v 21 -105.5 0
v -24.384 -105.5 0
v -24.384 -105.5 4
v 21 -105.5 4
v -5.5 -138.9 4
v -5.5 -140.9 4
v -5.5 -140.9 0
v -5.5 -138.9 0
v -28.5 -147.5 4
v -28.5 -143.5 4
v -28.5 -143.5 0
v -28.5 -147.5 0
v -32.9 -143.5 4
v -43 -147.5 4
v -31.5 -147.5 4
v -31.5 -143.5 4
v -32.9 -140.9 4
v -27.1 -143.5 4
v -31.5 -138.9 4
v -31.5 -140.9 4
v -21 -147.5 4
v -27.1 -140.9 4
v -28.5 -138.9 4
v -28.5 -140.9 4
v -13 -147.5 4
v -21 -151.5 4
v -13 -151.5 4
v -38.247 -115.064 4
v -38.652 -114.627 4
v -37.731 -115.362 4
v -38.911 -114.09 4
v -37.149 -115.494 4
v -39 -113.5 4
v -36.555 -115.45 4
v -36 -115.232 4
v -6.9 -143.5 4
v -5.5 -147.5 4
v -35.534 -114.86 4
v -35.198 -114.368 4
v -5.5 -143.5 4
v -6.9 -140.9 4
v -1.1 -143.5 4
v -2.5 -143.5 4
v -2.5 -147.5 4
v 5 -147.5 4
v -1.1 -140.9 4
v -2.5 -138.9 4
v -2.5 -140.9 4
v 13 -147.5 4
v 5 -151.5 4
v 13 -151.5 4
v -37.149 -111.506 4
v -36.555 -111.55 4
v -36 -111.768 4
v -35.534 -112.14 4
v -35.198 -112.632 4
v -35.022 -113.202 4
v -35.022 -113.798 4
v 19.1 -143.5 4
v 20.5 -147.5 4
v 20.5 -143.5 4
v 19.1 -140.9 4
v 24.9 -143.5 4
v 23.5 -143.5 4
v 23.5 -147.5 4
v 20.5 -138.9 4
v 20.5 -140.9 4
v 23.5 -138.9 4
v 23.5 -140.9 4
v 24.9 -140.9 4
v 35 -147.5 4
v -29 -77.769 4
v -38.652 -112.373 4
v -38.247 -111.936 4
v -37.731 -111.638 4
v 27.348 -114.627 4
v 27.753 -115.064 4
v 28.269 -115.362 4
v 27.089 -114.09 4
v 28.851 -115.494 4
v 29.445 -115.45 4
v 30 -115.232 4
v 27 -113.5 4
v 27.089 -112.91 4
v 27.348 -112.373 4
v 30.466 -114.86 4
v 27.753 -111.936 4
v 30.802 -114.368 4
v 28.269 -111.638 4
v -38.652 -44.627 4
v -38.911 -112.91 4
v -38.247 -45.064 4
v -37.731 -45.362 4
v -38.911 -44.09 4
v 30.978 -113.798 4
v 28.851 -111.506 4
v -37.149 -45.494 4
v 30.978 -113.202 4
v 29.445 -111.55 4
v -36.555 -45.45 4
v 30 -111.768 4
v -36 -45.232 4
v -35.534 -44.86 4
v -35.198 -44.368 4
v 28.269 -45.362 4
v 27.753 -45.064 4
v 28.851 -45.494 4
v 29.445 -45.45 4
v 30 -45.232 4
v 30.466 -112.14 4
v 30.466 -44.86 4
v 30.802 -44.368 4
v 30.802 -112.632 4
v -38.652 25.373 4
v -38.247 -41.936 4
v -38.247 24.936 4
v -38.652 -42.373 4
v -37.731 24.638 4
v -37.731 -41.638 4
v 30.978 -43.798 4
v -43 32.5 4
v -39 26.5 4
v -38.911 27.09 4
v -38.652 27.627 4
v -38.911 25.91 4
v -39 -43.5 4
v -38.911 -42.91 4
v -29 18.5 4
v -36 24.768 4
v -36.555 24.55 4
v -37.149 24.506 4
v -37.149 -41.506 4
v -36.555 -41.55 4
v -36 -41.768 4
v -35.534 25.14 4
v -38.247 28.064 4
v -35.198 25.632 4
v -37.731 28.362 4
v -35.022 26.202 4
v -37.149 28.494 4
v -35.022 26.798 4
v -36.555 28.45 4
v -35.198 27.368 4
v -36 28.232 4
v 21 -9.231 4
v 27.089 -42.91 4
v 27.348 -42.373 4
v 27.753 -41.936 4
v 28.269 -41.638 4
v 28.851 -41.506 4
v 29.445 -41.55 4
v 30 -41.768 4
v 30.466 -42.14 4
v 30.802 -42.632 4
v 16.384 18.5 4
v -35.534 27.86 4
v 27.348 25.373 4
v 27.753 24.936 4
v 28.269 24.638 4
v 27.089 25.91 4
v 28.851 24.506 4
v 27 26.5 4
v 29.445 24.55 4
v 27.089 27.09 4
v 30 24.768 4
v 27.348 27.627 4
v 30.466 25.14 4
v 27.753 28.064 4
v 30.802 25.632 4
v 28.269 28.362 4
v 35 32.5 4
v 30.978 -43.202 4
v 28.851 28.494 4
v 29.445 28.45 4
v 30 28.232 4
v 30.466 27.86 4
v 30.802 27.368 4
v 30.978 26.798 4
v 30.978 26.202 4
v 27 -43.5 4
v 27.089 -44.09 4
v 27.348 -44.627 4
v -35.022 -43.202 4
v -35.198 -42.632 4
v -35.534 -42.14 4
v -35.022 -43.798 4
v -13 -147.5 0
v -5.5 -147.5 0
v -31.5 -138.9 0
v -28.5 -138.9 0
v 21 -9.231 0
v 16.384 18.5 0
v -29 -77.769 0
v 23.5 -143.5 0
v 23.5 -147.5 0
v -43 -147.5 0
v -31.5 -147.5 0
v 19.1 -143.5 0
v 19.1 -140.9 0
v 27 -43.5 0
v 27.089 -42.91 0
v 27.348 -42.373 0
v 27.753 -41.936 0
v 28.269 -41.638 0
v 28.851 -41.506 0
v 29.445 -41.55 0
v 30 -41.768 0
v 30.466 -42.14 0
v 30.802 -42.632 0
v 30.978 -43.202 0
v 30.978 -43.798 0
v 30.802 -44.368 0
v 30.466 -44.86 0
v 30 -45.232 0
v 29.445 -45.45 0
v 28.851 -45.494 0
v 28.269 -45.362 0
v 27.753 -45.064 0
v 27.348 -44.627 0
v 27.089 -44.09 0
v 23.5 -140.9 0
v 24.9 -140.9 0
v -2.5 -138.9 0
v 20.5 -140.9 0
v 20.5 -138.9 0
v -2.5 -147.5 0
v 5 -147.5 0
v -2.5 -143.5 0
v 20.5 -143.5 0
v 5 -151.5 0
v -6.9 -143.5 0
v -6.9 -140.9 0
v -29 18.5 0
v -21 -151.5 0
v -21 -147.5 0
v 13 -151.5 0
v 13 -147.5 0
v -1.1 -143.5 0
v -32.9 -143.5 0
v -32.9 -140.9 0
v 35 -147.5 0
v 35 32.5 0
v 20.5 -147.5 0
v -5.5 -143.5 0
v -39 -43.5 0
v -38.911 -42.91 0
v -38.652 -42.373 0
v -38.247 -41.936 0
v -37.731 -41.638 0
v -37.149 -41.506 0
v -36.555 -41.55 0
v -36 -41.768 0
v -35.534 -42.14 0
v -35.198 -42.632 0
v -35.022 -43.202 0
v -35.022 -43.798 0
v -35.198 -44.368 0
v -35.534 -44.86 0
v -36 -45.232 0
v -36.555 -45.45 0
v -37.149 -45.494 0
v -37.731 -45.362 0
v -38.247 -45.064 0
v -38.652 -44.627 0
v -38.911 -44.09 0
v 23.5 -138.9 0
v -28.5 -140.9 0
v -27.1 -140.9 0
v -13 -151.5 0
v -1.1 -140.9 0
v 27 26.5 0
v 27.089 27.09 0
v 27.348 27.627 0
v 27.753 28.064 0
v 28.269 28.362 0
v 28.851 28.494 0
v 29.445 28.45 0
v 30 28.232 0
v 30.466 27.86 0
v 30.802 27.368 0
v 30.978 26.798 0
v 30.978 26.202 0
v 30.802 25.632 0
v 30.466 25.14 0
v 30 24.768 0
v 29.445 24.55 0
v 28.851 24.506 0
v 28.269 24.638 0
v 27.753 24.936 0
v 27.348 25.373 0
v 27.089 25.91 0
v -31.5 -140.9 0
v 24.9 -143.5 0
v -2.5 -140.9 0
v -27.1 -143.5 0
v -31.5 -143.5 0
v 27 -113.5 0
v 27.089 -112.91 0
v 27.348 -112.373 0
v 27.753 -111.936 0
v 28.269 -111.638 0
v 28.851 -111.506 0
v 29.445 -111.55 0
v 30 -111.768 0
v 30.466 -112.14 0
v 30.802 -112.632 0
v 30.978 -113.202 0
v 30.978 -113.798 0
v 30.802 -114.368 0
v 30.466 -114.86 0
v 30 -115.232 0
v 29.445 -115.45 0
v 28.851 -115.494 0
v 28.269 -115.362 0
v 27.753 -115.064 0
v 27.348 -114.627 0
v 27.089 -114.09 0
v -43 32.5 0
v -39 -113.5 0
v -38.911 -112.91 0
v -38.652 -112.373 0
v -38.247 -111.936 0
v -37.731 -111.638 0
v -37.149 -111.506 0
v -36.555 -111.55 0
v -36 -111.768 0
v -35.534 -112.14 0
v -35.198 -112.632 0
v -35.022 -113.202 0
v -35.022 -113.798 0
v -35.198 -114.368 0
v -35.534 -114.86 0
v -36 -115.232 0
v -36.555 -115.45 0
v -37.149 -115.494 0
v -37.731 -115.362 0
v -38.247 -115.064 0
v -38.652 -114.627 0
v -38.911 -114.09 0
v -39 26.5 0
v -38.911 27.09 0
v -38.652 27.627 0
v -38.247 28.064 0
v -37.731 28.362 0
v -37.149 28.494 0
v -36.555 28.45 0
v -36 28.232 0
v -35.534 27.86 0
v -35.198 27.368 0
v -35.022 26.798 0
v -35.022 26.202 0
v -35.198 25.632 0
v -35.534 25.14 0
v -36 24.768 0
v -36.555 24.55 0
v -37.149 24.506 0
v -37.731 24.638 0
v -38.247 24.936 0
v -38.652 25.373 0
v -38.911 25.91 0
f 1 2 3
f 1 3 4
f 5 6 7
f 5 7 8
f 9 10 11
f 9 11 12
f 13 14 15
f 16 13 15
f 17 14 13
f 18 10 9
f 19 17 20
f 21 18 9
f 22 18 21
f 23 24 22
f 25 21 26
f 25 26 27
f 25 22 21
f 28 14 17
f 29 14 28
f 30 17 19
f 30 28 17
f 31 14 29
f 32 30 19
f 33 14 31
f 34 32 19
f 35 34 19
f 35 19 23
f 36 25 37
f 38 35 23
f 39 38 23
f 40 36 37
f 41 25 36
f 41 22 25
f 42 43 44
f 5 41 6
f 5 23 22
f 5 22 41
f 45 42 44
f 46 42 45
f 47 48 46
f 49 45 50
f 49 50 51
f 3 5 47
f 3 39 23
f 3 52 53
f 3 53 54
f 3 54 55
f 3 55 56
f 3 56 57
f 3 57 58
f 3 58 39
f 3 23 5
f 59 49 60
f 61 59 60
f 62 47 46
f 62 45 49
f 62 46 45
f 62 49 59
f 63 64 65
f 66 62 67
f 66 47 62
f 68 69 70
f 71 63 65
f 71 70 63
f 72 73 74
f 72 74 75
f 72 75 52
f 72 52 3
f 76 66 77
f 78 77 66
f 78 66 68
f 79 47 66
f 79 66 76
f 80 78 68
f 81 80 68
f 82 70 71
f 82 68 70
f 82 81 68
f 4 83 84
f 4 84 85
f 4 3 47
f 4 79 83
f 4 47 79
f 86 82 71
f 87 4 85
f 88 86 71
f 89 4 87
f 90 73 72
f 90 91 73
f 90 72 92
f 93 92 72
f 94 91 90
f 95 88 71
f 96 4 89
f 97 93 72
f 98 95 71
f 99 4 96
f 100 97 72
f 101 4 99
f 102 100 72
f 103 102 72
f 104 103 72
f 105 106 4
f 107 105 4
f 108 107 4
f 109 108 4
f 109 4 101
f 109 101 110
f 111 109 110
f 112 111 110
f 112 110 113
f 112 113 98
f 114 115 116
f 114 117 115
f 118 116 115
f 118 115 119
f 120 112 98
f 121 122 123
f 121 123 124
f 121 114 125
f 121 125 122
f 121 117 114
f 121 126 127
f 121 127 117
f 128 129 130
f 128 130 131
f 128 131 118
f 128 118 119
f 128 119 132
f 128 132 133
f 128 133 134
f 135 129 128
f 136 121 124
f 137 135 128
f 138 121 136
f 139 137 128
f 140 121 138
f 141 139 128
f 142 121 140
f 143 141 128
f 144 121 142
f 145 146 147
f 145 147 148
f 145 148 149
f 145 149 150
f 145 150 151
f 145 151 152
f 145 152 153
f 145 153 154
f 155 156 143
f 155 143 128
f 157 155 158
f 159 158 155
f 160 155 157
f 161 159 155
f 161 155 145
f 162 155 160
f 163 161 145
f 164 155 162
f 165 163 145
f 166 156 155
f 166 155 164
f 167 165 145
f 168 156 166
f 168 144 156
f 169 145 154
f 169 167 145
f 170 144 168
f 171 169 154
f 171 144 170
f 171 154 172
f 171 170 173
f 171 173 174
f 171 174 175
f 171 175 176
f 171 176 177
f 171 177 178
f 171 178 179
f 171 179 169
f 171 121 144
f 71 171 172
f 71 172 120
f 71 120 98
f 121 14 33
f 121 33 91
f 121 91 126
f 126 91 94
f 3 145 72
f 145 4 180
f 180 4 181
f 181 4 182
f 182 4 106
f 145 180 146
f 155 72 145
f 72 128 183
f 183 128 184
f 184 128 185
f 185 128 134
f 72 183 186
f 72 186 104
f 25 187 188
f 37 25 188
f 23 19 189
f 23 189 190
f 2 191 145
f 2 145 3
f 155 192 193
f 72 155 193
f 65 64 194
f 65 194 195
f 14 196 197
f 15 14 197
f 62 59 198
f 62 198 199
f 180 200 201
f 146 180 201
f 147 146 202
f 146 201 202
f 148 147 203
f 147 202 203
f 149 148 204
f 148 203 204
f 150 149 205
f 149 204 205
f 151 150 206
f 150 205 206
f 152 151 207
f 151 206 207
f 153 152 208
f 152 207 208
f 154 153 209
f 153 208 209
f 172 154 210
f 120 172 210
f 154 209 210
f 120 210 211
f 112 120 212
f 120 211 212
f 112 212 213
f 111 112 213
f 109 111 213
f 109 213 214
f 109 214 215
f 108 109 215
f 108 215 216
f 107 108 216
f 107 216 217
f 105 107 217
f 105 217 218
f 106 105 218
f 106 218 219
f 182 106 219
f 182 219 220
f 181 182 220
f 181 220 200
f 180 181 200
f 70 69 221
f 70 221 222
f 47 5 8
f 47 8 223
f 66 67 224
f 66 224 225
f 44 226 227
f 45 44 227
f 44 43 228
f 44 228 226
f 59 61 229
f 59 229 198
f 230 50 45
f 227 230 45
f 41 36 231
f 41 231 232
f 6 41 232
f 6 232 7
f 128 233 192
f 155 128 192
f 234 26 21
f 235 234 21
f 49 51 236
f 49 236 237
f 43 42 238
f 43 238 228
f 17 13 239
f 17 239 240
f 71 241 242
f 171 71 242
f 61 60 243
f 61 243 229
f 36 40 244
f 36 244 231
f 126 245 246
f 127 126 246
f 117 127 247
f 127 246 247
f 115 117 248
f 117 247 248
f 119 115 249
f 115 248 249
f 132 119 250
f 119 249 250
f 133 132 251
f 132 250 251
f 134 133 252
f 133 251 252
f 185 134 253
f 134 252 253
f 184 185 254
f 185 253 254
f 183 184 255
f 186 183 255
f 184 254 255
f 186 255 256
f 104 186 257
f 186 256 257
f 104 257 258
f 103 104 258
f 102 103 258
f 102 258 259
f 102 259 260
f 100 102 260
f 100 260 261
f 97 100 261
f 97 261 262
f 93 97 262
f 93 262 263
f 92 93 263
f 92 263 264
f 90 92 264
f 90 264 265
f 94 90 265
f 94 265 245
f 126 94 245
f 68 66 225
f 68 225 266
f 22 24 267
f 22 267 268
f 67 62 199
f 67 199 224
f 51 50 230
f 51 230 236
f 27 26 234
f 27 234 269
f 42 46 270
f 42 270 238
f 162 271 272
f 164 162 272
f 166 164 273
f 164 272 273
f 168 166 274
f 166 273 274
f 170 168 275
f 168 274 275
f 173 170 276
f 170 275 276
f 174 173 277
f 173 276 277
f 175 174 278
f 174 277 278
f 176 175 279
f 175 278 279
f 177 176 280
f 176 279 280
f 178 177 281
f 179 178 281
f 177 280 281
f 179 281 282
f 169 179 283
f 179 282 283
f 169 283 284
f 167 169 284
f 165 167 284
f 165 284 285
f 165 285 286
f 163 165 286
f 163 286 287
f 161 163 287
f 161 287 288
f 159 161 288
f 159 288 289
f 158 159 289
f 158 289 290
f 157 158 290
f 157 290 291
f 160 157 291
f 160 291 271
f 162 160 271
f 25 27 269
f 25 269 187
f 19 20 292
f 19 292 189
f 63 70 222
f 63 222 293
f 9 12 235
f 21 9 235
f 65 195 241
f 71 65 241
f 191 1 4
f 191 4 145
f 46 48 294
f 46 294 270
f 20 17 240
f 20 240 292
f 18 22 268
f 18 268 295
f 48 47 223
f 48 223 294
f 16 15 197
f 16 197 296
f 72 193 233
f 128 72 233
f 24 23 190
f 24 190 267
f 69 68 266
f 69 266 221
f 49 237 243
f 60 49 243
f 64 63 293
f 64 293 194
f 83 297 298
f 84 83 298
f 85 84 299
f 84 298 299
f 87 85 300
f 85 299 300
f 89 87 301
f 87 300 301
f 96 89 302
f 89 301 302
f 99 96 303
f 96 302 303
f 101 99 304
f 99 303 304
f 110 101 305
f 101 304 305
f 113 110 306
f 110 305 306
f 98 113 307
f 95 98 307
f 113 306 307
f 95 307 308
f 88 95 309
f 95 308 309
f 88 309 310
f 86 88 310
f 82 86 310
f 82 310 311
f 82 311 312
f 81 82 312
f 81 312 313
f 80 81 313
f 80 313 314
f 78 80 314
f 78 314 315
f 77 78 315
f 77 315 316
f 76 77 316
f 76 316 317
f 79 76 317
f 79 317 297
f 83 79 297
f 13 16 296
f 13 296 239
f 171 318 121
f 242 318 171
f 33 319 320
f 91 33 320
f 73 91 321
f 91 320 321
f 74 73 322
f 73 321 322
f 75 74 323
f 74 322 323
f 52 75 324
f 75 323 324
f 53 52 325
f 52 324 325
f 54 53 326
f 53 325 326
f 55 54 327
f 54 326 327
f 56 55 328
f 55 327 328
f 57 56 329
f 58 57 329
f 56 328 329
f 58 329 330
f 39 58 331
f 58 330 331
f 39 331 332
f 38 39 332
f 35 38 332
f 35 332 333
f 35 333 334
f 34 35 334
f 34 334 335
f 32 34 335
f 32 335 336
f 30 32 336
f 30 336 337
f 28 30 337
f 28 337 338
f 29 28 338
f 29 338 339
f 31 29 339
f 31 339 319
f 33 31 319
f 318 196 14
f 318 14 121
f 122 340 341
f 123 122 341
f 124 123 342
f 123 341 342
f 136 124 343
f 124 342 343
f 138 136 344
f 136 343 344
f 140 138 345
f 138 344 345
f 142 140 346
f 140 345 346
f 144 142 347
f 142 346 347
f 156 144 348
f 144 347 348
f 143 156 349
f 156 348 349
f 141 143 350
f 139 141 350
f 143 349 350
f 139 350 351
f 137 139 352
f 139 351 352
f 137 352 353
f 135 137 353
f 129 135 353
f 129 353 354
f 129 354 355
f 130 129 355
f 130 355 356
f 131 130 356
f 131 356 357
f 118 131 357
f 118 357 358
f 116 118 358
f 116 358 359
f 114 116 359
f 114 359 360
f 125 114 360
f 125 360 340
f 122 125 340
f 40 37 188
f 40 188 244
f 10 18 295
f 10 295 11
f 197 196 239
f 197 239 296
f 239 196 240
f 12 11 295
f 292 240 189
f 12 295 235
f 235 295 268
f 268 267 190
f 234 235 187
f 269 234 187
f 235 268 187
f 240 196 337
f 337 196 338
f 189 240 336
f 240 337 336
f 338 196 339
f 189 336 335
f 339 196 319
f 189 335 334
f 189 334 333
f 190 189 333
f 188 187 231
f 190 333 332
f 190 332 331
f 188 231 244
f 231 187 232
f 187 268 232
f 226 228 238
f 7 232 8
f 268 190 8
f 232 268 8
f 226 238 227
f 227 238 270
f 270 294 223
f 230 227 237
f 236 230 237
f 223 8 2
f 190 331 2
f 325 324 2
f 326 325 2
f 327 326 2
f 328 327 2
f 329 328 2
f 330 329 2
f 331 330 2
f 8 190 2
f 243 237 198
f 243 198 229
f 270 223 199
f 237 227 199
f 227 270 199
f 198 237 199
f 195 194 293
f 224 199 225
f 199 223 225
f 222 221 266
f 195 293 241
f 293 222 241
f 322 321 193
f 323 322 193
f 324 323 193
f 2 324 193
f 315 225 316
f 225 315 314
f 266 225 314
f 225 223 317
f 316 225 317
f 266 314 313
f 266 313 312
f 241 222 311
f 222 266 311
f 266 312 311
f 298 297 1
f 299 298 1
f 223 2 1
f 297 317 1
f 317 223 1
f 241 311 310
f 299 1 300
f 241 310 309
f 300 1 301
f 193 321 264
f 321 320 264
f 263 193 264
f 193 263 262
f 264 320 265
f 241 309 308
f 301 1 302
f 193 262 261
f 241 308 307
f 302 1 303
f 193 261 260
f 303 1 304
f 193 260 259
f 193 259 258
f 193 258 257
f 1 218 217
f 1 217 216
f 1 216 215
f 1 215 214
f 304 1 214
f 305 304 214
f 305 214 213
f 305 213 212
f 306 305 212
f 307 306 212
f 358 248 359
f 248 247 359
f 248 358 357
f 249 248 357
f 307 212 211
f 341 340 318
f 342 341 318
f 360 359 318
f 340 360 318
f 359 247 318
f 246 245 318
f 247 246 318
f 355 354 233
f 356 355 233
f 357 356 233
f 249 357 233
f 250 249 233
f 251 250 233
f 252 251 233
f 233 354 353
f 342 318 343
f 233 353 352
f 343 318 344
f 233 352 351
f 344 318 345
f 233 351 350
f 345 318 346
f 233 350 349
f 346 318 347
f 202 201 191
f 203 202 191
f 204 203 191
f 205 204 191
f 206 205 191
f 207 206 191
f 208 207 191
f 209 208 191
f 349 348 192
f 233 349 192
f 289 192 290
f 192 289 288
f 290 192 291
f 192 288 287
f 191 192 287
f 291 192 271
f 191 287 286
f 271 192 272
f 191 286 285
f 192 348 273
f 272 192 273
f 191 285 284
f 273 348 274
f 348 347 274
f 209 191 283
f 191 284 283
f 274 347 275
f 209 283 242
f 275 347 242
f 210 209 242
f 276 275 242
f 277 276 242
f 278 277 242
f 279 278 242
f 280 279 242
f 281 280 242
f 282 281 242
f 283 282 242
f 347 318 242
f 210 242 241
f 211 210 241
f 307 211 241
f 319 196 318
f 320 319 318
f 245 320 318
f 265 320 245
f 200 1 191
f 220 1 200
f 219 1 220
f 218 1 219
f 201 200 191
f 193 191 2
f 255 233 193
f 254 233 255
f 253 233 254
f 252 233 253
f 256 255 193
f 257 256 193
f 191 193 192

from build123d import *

# Parameters (mm, degrees)
SKETCH_1_W          = 78
SKETCH_1_H          = 180
EXTRUDE_1_DEPTH     = 4
CUT_EXTRUDE_1_DEPTH = 4
SKETCH_6_W          = 8
SKETCH_6_H          = 8
EXTRUDE_2_DEPTH     = 4
SKETCH_7_R          = 2
CUT_EXTRUDE_2_DEPTH = 10


with BuildPart() as part:
    # 草图1 → 凸台-拉伸1 (new body)
    with BuildSketch(Plane.XY):
        with Locations((-4, -57.5)):
            Rectangle(SKETCH_1_W, SKETCH_1_H)
    extrude(amount=EXTRUDE_1_DEPTH)

    # 草图2 → 切除-拉伸1 (cut)
    with BuildSketch(Plane.XY.offset(4)):
        Polygon((-31.5, -147.5), (-31.5, -143.5), (-32.9, -143.5), (-32.9, -140.9), (-31.5, -140.9), (-31.5, -138.9), (-28.5, -138.9), (-28.5, -140.9), (-27.1, -140.9), (-27.1, -143.5), (-28.5, -143.5), (-28.5, -147.5), align=None)
        Polygon((23.5, -147.5), (20.5, -147.5), (20.5, -143.5), (19.1, -143.5), (19.1, -140.9), (20.5, -140.9), (20.5, -138.9), (23.5, -138.9), (23.5, -140.9), (24.9, -140.9), (24.9, -143.5), (23.5, -143.5), align=None)
        Polygon((-5.5, -147.5), (-5.5, -143.5), (-6.9, -143.5), (-6.9, -140.9), (-5.5, -140.9), (-5.5, -138.9), (-2.5, -138.9), (-2.5, -140.9), (-1.1, -140.9), (-1.1, -143.5), (-2.5, -143.5), (-2.5, -147.5), align=None)
    extrude(amount=-CUT_EXTRUDE_1_DEPTH, mode=Mode.SUBTRACT)

    # 草图6 → 凸台-拉伸2 (add)
    with BuildSketch(Plane.XY.offset(4)):
        with Locations((-17, -147.5)):
            Rectangle(SKETCH_6_W, SKETCH_6_H)
        with Locations((9, -147.5)):
            Rectangle(SKETCH_6_W, SKETCH_6_H)
    extrude(amount=-EXTRUDE_2_DEPTH)

    # 草图7 → 切除-拉伸2 (cut)
    with BuildSketch(Plane(origin=(0, 0, 0), x_dir=(-1, 0, 0), z_dir=(0, 0, -1))):
        with Locations((-29, 26.5)):
            Circle(SKETCH_7_R)
        with Locations((-29, -43.5)):
            Circle(SKETCH_7_R)
        with Locations((-29, -113.5)):
            Circle(SKETCH_7_R)
        with Locations((37, -43.5)):
            Circle(SKETCH_7_R)
        with Locations((37, -113.5)):
            Circle(SKETCH_7_R)
        with Locations((37, 26.5)):
            Circle(SKETCH_7_R)
        Polygon((29, 18.5), (-16.384156611, 18.5), (29, -77.769423114), align=None)
        Polygon((-21, -105.5), (-21, -9.230576886), (24.384156611, -105.5), align=None)
    extrude(amount=-CUT_EXTRUDE_2_DEPTH, mode=Mode.SUBTRACT)


solid = part.part
